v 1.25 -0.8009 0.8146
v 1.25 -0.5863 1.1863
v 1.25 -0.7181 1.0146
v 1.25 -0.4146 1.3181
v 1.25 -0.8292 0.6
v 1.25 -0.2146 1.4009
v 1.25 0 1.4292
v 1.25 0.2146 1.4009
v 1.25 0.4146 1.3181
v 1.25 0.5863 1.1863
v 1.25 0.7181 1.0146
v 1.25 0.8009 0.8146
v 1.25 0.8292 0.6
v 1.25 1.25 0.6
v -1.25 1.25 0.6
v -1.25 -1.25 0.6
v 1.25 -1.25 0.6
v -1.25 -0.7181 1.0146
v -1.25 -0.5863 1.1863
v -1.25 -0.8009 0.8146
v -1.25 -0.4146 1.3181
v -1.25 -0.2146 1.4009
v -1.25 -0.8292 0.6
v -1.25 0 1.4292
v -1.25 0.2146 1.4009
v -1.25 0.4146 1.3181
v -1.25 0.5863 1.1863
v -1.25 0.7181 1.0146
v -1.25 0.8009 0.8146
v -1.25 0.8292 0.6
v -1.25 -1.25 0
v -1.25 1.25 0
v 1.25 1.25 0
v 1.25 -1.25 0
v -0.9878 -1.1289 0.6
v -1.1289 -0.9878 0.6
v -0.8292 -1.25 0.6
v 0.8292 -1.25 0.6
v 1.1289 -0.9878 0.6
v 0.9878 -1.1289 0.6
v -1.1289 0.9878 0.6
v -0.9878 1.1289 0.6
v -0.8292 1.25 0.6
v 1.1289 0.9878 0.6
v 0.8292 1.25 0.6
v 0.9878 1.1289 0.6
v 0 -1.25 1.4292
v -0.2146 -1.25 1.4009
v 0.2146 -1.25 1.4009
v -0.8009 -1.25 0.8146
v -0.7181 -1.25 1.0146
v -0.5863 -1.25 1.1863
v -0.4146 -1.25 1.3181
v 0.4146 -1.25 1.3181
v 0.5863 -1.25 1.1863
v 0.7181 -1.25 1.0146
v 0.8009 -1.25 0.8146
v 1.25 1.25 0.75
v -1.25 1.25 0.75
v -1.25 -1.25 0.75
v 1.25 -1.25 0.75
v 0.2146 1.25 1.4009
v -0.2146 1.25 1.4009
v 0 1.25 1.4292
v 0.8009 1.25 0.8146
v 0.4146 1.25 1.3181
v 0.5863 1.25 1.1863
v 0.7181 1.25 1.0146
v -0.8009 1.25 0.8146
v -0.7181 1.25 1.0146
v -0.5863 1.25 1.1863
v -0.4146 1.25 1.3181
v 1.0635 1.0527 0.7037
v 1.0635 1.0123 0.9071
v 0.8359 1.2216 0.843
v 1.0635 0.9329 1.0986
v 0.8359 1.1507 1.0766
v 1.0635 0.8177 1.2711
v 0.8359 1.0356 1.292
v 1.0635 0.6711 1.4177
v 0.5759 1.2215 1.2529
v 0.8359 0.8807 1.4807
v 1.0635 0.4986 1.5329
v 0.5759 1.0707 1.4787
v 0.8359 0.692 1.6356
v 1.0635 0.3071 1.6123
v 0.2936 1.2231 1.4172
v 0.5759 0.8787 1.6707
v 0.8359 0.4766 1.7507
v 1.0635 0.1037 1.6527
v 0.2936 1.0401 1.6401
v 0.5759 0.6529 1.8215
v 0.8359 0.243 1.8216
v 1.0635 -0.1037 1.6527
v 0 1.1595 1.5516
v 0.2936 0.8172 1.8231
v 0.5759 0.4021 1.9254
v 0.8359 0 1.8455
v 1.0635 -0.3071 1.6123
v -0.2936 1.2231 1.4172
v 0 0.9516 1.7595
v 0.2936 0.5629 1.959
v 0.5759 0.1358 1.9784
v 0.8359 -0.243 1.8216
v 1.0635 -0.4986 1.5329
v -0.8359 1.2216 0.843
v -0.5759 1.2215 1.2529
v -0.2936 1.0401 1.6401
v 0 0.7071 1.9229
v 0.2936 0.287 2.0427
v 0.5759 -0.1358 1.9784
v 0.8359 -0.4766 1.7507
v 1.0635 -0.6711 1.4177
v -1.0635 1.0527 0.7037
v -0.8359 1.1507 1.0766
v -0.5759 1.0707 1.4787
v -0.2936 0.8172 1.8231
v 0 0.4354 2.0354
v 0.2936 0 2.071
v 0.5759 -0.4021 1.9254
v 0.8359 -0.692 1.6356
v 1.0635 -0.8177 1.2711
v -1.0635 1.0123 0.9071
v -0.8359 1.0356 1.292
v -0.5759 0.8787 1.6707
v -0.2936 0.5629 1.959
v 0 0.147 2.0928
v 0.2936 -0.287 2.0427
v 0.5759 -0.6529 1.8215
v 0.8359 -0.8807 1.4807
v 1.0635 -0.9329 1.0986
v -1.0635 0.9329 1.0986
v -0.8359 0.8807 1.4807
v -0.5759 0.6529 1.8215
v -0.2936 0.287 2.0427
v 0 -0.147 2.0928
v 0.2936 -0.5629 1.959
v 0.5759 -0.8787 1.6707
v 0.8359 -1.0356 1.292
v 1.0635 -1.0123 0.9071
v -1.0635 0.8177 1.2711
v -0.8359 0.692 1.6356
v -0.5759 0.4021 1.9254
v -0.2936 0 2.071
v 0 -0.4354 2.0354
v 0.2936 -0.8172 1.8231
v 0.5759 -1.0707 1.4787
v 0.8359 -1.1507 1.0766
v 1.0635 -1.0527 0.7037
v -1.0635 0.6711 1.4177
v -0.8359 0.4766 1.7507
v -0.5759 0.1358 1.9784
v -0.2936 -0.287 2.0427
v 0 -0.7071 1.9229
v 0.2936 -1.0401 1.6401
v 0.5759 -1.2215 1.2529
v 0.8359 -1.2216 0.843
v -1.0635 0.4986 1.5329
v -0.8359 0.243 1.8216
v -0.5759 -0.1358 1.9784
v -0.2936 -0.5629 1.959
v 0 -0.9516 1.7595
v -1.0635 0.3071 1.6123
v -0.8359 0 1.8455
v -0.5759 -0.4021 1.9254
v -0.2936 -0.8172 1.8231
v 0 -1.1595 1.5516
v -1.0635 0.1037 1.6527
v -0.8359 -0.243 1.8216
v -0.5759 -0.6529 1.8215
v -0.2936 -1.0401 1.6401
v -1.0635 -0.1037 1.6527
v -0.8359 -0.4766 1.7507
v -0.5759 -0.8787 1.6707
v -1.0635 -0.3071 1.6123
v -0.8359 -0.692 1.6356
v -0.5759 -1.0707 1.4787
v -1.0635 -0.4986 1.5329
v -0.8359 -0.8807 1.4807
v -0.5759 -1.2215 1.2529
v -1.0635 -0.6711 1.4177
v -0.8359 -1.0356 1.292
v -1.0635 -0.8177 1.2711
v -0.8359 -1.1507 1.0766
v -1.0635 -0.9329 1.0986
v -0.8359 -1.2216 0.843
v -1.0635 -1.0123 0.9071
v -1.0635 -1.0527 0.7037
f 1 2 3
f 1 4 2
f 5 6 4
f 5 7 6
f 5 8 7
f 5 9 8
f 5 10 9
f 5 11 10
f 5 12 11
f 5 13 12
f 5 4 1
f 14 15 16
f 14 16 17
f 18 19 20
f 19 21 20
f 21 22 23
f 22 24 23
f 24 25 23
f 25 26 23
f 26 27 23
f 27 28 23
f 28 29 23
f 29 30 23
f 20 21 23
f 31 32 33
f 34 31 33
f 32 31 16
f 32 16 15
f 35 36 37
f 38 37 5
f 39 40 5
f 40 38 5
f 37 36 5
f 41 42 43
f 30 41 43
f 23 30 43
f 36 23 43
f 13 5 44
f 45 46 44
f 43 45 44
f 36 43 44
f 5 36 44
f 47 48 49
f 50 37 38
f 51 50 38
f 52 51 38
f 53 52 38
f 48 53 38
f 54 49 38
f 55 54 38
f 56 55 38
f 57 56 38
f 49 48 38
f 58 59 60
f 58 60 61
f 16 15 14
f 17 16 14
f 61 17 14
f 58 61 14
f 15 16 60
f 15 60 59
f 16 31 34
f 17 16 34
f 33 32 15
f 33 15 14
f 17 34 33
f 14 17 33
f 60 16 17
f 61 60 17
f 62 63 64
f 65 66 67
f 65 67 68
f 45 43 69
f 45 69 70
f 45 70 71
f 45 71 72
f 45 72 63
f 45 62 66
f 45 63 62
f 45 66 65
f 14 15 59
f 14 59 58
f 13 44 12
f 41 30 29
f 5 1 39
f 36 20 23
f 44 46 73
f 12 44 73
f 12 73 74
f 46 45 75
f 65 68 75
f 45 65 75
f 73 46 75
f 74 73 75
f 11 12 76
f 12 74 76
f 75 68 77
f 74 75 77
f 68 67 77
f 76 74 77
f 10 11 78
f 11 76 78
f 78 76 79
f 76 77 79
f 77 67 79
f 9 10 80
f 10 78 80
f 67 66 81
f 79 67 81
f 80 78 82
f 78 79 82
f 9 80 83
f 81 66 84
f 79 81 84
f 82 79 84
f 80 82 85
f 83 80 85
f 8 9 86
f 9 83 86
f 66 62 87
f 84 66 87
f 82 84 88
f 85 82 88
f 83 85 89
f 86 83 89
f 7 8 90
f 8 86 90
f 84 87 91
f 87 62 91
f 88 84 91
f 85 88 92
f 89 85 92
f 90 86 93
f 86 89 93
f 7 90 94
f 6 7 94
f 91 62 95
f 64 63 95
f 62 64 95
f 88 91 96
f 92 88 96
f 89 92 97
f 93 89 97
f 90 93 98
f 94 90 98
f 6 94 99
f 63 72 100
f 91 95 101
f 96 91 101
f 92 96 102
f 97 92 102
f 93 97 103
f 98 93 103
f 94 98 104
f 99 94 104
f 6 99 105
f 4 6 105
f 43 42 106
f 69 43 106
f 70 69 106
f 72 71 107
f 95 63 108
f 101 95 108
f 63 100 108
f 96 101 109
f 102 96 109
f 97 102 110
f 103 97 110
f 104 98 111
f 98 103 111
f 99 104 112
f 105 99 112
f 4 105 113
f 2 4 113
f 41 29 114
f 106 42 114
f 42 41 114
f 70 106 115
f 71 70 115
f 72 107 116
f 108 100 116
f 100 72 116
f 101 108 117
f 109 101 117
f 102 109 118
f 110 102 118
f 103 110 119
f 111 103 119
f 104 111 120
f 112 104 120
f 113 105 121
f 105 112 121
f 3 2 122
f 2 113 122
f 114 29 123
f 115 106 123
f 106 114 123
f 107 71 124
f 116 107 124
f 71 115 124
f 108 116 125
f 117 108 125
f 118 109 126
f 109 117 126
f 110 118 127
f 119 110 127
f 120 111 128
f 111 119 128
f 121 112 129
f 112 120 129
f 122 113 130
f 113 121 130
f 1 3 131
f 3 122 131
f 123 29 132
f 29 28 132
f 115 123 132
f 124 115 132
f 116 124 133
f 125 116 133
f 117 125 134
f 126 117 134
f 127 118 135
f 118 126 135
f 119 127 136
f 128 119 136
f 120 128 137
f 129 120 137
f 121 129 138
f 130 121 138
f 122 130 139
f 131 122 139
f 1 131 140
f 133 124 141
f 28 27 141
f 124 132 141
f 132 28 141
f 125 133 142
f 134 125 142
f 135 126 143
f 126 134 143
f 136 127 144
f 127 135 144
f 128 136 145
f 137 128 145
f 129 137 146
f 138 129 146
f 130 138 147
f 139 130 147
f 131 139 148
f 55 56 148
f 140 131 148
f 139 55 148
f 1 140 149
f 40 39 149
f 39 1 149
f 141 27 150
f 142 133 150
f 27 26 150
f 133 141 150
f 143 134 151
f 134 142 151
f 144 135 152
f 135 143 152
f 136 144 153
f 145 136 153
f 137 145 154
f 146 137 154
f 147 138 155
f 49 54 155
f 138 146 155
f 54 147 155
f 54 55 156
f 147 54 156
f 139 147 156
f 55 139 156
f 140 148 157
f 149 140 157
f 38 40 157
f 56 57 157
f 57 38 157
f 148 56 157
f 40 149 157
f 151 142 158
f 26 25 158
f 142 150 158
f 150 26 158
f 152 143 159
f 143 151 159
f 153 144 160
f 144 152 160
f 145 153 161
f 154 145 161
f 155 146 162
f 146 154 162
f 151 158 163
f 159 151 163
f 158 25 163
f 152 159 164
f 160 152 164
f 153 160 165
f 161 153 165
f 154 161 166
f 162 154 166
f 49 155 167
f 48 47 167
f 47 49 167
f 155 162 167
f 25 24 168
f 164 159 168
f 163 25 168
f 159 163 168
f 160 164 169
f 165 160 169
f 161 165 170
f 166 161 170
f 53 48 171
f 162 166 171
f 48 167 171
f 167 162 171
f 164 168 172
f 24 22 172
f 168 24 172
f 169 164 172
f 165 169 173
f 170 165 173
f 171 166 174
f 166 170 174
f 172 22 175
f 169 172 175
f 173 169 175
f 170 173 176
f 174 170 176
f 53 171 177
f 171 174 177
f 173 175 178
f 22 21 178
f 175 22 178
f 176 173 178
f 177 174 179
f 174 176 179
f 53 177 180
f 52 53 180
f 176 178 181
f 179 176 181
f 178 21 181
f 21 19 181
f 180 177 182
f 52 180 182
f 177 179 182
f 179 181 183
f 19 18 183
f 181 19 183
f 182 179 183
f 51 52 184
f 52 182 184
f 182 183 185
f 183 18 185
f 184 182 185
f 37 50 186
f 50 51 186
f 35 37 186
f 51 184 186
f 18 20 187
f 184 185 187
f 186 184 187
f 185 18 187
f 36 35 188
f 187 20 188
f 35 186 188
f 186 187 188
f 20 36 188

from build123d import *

# Parameters (mm, degrees)
F0_W          = 2.5
F0_H          = 2.5
F1_DEPTH      = 0.6
F2_W          = 2.5
F2_H          = 2.5
F3_DEPTH      = 0.15
F6_ANGLE_BACK = 90
F6_ANGLE      = 180
F7_W          = 2.5
F7_H          = 2.5
F8_DEPTH      = 2.101


with BuildPart() as f1:
    # F0 (on Top) → F1 (new body)
    with BuildSketch(Plane.XY):
        Rectangle(F0_W, F0_H)
    extrude(amount=F1_DEPTH)


with BuildPart() as f3:
    # F2 (on face) → F3 (new body)
    with BuildSketch(Plane.XY.offset(0.6)):
        Rectangle(F2_W, F2_H)
    extrude(amount=F3_DEPTH)


with BuildPart() as f6:
    # F5 (on Front) → F6 (revolve)
    with BuildSketch(Plane.XZ, mode=Mode.PRIVATE) as f6_sk:
        with BuildLine():
            Line((-1.5, 0.6), (1.5, 0.6))
            ThreePointArc((1.5, 0.6), (0, 2.1), (-1.5, 0.6))
        make_face()
    revolve(f6_sk.sketch.rotate(Axis((0, 0, 0.6), (1, 0, 0)), -F6_ANGLE_BACK), axis=Axis((0, 0, 0.6), (1, 0, 0)), revolution_arc=F6_ANGLE)


with BuildPart() as f8_tool:
    # F7 (on face) → F8 (new body, through all)
    with BuildSketch(Plane(origin=(0, 0, 0), x_dir=(1, 0, 0), z_dir=(0, 0, -1))):
        Rectangle(F7_W, F7_H)
    extrude(amount=-F8_DEPTH)


with BuildPart() as f1_1:
    add(f1.part)

    # F8: intersect by f8_tool
    add(f8_tool.part, mode=Mode.INTERSECT)


with BuildPart() as f3_1:
    add(f3.part)

    # F8: intersect by f8_tool
    add(f8_tool.part, mode=Mode.INTERSECT)


with BuildPart() as f6_1:
    add(f6.part)

    # F8: intersect by f8_tool
    add(f8_tool.part, mode=Mode.INTERSECT)


solid = Compound([f1_1.part, f3_1.part, f6_1.part])
